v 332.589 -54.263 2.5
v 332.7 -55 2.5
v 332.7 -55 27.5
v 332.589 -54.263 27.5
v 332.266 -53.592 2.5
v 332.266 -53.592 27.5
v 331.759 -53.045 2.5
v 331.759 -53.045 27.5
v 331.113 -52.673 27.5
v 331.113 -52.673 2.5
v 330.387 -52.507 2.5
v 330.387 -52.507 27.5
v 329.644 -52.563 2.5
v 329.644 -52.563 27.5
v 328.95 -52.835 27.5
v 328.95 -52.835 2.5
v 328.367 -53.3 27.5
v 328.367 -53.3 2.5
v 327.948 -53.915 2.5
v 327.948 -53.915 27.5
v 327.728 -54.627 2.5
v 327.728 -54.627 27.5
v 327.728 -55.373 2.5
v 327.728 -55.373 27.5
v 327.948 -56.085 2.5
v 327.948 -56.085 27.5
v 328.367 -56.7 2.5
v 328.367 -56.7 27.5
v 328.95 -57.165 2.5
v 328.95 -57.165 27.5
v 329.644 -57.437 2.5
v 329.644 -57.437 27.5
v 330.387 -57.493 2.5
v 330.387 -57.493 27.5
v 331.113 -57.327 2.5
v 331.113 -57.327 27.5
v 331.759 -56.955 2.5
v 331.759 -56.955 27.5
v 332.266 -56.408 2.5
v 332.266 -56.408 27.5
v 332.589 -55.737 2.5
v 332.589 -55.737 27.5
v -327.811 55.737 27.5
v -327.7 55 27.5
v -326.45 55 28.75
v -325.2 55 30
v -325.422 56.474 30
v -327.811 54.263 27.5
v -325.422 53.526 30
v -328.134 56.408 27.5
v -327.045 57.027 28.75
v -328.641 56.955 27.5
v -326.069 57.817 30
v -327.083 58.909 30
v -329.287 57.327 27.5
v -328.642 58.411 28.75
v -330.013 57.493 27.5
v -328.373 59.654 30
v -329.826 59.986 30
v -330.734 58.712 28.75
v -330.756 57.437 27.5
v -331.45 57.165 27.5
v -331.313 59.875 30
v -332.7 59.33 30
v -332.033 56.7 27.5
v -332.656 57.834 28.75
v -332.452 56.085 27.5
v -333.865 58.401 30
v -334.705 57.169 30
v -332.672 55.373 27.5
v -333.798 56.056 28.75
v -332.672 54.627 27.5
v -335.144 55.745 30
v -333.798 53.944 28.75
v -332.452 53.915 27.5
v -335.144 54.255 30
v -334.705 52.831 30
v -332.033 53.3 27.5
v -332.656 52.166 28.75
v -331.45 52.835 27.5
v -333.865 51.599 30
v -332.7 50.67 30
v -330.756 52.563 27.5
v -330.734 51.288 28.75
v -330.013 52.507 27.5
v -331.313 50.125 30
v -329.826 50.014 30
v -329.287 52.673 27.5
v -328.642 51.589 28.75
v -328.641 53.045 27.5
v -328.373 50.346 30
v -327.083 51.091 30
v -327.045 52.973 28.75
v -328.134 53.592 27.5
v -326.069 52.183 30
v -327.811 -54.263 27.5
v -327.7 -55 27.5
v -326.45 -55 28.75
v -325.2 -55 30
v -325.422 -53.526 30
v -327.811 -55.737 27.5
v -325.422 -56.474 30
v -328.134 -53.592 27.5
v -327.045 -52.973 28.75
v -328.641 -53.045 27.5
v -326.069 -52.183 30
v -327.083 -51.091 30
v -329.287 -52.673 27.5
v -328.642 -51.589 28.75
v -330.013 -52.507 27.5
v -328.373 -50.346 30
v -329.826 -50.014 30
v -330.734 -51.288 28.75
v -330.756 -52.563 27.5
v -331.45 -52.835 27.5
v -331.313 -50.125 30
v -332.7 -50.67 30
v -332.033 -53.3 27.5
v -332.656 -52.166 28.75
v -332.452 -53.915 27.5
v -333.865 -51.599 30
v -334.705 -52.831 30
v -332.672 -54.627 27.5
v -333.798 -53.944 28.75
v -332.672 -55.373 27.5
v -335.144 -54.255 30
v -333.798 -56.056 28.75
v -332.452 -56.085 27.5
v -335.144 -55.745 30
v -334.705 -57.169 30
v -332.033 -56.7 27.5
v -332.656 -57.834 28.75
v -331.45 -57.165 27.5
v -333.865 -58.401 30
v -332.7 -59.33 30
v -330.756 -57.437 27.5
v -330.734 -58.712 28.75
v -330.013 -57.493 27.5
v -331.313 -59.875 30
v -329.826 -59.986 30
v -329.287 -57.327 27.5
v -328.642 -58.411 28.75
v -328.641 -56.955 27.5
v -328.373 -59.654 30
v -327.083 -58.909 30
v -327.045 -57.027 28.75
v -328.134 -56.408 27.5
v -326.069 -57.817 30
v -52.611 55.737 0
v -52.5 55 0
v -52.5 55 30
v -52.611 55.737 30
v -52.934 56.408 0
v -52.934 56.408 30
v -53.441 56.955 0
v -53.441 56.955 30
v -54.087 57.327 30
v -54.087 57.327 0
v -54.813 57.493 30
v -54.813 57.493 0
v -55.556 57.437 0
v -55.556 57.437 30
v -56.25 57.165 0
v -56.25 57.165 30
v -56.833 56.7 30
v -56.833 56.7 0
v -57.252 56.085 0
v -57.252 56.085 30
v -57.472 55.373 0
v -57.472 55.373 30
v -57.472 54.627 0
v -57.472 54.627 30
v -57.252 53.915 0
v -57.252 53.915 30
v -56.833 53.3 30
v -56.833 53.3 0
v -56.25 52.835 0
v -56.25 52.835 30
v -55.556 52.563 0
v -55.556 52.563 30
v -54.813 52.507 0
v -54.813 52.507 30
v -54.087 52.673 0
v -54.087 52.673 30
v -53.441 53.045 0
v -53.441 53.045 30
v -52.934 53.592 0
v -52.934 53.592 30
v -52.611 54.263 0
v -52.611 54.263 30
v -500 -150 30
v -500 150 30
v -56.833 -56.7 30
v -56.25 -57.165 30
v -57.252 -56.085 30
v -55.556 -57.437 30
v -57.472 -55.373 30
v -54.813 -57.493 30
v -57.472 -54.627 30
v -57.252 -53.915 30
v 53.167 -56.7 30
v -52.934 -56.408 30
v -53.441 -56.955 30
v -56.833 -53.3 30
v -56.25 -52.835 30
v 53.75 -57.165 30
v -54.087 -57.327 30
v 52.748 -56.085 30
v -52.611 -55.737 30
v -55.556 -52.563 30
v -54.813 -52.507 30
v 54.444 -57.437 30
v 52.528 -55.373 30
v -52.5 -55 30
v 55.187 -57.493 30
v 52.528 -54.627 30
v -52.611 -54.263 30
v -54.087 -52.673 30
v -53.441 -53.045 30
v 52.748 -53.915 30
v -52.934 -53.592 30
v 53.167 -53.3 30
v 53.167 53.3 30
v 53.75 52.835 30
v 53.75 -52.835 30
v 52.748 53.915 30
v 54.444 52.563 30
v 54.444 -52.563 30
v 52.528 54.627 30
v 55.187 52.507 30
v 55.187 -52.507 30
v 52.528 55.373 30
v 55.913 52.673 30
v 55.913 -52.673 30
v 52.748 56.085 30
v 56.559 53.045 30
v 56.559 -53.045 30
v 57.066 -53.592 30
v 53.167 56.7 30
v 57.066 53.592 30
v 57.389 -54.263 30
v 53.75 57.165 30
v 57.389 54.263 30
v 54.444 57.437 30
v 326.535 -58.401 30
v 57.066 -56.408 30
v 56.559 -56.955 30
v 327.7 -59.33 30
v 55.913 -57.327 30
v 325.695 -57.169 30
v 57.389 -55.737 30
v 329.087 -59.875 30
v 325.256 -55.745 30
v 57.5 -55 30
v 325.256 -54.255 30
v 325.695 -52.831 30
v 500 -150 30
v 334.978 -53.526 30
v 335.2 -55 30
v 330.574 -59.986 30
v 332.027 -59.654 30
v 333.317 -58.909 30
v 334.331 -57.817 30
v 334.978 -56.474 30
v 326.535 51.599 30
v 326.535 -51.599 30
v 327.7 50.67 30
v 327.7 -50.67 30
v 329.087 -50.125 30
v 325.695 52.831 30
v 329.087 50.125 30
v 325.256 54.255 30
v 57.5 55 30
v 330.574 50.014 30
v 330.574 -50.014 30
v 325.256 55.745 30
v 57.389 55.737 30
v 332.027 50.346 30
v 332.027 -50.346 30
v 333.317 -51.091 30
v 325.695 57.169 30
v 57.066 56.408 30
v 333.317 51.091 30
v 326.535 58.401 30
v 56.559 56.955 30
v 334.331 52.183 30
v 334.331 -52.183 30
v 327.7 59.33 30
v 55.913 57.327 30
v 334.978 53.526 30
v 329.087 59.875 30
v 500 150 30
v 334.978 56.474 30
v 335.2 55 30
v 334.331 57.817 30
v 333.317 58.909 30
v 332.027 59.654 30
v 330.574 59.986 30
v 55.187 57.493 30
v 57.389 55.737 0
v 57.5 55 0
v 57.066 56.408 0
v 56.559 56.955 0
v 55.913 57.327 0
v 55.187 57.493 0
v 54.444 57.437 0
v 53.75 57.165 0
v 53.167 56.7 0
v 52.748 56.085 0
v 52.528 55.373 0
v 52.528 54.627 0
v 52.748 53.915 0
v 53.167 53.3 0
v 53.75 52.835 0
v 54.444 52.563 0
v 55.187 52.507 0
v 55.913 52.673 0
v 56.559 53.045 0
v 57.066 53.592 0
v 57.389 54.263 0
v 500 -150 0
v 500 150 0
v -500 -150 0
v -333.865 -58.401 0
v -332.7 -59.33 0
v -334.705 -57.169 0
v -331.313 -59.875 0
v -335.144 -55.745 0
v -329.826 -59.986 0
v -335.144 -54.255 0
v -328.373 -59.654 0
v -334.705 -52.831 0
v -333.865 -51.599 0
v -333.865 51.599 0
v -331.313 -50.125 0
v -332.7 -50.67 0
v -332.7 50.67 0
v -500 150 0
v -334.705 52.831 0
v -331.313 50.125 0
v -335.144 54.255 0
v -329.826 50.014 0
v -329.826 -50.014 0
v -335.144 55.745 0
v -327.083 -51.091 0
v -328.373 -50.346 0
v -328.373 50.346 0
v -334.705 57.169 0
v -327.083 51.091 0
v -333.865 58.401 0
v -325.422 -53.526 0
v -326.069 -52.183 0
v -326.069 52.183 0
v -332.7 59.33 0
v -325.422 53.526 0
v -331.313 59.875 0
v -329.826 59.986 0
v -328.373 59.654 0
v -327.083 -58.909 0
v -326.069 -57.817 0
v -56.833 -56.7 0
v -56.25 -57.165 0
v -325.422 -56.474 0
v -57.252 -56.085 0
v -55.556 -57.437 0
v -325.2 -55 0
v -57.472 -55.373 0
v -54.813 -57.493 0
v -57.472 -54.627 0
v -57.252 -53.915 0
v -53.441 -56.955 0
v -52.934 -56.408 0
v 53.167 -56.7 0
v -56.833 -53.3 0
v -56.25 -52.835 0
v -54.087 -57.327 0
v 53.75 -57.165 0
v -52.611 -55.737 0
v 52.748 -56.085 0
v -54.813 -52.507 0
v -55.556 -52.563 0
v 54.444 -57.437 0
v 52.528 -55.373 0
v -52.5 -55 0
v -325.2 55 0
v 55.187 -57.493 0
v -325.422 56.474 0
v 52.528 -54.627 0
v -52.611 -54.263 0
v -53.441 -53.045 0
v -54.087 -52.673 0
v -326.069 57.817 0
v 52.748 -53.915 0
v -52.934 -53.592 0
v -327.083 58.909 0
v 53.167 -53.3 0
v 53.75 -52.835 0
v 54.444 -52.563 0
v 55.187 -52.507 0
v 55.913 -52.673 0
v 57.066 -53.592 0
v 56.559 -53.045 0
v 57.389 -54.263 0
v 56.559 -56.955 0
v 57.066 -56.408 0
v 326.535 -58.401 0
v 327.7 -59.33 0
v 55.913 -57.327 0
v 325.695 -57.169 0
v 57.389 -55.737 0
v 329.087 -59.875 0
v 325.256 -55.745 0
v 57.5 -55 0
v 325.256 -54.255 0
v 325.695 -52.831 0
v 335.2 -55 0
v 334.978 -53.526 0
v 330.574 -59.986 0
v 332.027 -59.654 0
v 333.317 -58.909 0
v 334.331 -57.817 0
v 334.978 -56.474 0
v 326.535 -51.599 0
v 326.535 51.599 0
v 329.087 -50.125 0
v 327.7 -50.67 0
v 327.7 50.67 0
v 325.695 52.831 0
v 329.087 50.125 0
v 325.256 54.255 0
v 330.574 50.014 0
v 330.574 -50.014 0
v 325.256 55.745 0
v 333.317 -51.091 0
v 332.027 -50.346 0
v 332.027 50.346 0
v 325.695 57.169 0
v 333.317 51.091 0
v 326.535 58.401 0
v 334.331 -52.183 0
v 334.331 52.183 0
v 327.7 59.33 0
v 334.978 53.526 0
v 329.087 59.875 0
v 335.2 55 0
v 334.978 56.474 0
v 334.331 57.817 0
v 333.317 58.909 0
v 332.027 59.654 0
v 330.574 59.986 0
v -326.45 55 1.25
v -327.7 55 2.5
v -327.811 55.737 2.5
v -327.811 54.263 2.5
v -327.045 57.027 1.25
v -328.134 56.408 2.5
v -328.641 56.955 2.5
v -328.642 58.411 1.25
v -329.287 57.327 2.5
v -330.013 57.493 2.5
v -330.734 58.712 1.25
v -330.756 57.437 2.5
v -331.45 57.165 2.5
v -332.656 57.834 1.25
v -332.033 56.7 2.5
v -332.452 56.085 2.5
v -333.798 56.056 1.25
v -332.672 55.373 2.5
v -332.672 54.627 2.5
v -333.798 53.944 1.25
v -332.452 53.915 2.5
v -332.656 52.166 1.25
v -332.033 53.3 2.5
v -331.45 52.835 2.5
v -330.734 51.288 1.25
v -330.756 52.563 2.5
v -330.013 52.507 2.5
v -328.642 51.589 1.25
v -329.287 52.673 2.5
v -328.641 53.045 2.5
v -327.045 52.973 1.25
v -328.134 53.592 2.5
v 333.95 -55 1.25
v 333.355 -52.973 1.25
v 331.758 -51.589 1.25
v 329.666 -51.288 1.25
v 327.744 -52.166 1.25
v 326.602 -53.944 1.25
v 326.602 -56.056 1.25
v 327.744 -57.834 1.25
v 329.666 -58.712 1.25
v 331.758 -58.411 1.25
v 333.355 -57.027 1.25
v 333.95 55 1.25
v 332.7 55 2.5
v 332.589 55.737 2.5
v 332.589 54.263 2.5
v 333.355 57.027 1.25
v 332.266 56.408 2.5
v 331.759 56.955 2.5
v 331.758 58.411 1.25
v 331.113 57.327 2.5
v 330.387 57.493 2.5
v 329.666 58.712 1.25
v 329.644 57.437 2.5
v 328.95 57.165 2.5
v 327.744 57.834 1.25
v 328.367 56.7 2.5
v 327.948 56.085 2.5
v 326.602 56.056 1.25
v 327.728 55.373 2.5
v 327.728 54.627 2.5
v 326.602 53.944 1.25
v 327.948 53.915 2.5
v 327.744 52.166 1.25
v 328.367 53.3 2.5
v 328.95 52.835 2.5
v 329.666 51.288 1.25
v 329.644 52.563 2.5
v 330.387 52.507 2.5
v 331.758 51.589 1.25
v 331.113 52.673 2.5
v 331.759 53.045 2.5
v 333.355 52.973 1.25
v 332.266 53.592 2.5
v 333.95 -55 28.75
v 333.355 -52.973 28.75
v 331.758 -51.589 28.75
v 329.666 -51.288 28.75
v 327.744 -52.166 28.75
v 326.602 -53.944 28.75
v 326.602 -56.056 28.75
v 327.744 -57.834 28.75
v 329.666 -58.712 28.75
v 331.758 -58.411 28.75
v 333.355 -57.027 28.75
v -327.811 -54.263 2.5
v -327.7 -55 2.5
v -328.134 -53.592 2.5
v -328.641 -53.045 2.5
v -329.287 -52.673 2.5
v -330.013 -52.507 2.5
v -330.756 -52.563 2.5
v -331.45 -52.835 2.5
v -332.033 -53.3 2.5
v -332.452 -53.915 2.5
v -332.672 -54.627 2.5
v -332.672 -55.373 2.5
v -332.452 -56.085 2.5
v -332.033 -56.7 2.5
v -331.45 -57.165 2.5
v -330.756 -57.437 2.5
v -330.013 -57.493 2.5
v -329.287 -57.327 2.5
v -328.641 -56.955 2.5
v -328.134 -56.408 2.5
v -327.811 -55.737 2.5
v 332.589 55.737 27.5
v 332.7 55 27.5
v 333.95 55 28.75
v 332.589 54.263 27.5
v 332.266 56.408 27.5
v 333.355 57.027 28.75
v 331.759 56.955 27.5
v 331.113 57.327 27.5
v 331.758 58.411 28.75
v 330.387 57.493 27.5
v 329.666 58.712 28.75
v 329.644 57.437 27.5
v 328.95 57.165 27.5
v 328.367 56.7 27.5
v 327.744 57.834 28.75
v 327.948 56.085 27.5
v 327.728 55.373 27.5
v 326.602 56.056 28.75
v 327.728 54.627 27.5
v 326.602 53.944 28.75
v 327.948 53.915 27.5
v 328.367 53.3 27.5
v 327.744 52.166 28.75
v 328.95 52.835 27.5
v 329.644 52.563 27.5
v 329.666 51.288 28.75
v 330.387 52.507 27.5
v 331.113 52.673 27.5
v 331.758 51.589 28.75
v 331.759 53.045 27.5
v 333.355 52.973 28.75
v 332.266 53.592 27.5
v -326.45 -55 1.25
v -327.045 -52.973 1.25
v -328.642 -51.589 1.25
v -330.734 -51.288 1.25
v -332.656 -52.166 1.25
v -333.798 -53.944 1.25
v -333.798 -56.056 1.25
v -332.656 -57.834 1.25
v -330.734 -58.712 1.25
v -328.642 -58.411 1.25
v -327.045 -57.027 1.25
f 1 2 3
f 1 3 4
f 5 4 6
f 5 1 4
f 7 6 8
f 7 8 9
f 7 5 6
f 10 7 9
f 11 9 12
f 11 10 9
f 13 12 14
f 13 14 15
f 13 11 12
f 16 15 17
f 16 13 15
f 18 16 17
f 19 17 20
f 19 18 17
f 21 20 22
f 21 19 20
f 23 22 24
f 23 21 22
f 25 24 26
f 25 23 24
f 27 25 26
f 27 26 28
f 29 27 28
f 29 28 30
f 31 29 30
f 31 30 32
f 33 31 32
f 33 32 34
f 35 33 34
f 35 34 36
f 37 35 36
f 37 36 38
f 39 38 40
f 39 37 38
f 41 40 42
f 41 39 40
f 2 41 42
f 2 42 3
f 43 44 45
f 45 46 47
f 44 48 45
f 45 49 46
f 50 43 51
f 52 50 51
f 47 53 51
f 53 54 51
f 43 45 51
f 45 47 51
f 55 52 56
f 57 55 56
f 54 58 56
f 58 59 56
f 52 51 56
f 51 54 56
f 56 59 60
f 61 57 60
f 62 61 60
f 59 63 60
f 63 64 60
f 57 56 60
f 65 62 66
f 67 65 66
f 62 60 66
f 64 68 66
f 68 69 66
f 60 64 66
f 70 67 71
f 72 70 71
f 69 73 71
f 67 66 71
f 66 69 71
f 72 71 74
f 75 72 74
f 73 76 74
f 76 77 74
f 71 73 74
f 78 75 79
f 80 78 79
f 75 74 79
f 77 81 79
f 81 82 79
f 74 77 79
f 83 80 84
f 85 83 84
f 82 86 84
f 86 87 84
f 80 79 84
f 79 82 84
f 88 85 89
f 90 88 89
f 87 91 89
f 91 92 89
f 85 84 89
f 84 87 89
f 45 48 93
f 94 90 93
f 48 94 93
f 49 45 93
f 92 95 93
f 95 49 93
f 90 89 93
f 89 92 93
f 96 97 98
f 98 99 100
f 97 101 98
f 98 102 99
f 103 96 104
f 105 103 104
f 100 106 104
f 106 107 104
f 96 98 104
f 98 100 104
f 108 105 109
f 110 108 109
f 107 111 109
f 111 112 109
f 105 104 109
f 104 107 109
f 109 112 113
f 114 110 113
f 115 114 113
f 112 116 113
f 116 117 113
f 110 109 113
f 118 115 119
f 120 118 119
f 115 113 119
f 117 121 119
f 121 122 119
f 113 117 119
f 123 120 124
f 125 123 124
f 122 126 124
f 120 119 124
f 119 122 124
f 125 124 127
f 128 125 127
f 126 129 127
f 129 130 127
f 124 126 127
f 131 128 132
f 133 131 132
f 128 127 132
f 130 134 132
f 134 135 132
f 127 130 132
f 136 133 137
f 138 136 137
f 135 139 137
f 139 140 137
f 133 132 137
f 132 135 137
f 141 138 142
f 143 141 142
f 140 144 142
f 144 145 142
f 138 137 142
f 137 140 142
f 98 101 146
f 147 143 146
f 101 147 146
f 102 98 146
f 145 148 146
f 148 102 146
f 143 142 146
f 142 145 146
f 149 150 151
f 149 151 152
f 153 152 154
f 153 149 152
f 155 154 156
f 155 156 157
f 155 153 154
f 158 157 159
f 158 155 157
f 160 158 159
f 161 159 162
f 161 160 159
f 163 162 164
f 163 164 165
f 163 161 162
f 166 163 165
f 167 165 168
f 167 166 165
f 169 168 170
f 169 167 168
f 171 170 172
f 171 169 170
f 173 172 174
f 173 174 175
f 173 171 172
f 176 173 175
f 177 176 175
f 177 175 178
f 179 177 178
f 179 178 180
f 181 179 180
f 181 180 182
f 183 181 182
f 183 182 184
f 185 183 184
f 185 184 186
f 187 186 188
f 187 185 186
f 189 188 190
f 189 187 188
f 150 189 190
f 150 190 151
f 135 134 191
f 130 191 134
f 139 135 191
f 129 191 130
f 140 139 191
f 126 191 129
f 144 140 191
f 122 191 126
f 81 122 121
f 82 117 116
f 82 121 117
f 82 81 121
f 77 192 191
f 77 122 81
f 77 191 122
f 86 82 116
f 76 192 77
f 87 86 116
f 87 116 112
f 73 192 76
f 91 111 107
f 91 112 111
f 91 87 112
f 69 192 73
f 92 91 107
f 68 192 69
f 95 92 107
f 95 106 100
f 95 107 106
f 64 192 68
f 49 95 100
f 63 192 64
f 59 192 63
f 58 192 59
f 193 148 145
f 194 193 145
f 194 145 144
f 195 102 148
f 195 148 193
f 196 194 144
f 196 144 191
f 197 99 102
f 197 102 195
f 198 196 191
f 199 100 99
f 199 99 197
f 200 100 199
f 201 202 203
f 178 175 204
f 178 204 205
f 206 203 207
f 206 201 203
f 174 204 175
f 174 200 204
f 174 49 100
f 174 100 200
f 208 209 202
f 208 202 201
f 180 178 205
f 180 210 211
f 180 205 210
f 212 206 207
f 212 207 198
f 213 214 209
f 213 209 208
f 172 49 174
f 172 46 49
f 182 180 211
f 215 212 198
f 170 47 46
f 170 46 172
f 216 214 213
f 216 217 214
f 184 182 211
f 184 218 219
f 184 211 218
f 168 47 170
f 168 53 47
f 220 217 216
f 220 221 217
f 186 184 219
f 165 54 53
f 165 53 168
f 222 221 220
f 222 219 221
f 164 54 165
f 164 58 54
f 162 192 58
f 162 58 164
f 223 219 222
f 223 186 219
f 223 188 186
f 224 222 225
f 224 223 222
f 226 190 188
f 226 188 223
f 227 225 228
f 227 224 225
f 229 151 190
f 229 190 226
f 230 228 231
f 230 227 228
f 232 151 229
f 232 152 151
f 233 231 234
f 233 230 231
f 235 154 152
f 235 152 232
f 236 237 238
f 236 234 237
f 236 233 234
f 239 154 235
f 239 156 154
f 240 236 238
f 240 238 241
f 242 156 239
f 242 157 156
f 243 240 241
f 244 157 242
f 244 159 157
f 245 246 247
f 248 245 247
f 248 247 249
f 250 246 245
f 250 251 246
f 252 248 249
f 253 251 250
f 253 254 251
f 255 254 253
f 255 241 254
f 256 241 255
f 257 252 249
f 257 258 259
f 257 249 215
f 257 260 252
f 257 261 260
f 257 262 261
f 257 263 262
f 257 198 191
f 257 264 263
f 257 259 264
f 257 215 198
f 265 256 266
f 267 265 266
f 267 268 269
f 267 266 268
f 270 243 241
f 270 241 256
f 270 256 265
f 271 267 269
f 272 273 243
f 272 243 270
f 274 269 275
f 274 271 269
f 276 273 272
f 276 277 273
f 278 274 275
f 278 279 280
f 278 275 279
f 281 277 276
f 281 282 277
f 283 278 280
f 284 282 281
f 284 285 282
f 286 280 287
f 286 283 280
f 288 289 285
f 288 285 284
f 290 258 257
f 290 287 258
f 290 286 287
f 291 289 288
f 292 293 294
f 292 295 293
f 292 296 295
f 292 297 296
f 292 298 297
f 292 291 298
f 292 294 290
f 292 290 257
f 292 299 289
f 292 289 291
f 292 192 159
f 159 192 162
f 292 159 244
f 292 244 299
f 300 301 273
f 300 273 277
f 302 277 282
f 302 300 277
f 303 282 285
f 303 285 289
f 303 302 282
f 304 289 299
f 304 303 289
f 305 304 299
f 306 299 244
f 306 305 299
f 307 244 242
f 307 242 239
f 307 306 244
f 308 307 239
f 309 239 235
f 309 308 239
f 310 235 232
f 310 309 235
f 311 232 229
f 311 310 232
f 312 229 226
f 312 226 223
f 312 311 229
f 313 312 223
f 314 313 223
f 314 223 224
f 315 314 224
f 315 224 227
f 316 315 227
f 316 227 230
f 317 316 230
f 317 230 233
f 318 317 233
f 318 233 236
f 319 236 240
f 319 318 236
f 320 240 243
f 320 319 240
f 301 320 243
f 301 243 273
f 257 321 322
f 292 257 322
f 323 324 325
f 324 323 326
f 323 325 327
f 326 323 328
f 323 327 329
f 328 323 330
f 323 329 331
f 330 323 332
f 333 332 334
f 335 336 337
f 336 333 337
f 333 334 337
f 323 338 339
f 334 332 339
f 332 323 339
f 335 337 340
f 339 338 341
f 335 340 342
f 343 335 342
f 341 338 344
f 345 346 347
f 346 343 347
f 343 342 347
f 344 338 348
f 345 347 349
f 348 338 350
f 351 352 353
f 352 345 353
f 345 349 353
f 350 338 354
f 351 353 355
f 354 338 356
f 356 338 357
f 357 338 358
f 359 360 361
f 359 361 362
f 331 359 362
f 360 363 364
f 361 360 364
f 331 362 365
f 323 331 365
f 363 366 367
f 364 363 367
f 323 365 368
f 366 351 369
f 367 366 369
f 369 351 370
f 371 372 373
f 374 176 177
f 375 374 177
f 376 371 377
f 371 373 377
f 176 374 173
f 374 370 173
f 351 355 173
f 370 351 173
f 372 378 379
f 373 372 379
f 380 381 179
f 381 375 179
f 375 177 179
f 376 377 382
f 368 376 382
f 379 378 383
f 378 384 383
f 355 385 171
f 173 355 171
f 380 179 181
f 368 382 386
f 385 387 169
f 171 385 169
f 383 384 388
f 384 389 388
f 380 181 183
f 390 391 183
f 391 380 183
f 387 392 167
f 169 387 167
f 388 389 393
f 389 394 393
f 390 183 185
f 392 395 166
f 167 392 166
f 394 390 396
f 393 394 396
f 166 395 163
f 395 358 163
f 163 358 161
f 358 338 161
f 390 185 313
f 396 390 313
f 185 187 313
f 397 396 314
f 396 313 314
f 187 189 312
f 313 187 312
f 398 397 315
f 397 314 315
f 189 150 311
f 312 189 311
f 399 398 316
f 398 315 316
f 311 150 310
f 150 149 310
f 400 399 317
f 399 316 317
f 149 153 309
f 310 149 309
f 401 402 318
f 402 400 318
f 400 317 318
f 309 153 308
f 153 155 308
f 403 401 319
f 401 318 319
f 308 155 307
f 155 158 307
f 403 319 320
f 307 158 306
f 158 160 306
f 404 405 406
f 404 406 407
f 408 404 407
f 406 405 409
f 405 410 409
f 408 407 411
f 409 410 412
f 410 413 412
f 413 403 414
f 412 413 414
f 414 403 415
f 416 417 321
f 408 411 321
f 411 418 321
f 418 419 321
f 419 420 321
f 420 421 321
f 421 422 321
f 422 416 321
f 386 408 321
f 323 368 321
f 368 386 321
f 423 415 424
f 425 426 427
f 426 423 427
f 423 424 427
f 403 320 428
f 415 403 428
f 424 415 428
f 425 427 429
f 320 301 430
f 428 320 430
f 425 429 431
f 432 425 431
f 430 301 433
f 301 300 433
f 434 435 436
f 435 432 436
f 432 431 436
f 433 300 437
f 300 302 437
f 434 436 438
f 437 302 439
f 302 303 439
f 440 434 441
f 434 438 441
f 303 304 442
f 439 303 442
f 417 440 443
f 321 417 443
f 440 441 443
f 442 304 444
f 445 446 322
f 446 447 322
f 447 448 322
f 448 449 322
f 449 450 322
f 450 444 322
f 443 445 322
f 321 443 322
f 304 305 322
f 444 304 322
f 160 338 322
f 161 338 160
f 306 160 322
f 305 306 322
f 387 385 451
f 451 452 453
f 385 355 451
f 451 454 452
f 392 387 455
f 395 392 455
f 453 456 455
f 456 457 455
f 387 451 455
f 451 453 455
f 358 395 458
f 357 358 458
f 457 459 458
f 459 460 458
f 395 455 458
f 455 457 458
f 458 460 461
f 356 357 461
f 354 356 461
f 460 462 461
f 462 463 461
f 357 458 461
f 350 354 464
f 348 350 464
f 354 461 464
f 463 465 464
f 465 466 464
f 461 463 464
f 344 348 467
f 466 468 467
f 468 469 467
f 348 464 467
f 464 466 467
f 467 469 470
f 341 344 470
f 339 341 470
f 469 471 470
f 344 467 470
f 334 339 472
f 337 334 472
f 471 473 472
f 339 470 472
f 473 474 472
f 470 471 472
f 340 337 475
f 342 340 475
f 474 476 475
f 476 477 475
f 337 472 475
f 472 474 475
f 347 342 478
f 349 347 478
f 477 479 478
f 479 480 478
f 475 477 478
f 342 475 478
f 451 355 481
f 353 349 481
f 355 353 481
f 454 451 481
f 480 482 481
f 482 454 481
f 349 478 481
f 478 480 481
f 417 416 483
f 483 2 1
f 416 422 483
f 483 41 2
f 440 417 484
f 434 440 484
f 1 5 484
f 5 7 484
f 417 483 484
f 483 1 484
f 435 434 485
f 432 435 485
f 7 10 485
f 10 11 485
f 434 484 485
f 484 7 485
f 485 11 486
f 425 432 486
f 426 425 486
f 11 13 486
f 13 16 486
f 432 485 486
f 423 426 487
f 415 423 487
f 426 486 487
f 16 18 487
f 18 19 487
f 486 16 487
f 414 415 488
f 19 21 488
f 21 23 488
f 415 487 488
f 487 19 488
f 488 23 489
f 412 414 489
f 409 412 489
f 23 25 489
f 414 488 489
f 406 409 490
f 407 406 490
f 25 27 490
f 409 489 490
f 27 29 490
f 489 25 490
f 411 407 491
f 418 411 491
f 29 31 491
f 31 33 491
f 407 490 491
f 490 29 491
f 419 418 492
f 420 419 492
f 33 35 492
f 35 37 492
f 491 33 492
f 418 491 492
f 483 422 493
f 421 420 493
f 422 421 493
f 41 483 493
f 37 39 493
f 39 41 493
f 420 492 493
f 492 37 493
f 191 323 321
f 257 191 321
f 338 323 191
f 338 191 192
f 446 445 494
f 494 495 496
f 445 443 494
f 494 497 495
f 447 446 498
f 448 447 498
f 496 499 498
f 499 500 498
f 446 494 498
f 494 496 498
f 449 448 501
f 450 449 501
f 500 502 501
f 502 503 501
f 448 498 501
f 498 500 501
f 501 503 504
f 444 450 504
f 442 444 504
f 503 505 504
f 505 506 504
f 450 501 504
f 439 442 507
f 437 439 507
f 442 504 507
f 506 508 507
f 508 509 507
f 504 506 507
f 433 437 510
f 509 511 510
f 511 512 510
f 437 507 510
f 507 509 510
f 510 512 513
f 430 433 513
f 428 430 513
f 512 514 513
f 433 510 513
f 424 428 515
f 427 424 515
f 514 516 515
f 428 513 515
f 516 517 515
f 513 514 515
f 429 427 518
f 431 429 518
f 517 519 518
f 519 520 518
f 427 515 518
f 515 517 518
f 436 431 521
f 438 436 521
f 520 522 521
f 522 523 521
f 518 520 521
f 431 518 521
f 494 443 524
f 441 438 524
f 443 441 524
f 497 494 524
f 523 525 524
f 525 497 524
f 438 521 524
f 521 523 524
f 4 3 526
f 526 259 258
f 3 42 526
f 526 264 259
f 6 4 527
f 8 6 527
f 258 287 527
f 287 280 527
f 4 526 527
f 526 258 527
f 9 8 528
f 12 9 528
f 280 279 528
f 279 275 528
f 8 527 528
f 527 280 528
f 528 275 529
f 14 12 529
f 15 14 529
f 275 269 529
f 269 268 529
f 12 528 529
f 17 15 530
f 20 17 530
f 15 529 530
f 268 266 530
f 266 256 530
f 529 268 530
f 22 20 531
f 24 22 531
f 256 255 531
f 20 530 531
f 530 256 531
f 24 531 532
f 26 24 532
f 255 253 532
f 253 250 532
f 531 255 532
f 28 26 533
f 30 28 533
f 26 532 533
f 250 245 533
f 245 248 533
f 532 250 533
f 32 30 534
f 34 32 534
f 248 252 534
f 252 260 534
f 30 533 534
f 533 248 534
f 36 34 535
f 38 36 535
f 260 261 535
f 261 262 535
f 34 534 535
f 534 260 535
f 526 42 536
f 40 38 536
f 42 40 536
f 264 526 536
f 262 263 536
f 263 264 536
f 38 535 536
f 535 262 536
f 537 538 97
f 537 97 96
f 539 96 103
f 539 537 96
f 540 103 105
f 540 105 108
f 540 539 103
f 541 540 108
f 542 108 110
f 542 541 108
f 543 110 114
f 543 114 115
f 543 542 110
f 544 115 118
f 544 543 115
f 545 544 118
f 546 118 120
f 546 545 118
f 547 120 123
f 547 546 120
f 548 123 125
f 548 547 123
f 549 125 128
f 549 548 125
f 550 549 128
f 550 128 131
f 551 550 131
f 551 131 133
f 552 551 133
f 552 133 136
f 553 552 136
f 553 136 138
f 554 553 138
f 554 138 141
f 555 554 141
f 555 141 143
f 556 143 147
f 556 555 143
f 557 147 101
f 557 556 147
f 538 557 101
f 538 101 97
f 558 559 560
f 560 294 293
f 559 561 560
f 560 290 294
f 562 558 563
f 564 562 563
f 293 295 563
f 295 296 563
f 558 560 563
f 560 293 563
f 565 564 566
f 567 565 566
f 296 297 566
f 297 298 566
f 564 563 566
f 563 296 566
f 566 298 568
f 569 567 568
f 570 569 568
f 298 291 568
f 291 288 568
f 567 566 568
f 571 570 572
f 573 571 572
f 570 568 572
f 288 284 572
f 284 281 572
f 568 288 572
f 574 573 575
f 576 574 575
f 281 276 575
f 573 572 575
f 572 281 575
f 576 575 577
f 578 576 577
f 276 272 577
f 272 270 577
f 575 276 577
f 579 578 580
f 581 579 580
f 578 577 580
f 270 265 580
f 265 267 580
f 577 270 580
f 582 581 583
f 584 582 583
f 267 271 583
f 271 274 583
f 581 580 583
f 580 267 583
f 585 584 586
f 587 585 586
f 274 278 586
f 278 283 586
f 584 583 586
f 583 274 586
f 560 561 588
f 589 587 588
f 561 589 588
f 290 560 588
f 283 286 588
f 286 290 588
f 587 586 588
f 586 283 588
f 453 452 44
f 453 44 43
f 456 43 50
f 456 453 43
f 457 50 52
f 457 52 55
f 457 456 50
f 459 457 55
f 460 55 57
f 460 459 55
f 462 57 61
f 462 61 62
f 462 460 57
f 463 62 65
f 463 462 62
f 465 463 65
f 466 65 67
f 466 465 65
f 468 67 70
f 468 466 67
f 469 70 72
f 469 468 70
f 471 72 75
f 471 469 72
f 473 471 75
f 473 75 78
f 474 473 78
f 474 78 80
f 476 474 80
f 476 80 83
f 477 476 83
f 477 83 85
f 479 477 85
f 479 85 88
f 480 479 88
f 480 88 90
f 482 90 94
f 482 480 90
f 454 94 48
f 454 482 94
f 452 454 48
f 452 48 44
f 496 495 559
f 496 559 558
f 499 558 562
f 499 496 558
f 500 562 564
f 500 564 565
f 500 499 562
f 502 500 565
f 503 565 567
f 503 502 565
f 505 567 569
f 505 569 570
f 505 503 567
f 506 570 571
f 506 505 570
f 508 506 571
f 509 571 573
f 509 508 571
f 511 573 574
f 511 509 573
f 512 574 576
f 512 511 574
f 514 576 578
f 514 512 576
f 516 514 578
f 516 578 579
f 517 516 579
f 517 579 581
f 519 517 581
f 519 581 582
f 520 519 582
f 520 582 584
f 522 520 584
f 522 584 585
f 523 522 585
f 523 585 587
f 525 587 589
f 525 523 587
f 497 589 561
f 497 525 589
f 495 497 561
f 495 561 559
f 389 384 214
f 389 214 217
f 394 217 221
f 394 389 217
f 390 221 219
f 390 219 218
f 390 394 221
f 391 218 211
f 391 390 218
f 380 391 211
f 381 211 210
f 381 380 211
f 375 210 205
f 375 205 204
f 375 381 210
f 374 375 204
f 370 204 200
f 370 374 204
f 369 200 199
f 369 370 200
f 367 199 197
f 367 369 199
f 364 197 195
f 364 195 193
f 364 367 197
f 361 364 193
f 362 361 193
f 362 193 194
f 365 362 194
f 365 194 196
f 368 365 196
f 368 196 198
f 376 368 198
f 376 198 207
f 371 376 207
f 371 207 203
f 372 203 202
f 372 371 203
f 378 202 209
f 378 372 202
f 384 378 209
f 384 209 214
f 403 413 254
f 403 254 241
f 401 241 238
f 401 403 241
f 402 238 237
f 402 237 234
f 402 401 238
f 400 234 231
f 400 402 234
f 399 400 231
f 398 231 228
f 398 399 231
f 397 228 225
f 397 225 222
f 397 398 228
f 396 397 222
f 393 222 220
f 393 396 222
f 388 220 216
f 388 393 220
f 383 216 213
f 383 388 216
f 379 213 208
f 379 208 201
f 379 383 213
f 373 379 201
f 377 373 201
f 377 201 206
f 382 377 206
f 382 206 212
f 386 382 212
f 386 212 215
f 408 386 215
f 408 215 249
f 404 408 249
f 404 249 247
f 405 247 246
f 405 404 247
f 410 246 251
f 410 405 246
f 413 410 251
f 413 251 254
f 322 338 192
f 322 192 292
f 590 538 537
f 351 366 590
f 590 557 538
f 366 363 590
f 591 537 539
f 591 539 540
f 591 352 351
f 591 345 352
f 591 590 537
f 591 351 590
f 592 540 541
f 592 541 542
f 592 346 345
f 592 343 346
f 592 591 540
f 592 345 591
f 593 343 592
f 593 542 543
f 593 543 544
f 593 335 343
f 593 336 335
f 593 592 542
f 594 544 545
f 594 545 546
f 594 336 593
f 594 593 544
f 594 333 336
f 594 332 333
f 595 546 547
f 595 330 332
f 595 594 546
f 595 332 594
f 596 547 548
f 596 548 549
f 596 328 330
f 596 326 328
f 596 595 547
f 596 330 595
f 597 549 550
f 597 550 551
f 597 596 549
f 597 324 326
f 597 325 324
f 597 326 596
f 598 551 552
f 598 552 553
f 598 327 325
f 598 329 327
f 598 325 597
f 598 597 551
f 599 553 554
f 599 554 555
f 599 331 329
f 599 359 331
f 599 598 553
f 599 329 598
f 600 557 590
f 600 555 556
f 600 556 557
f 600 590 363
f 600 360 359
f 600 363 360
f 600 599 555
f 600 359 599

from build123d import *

# Parameters (mm, degrees)
F0_W     = 1000
F0_H     = 300
F0_R     = 2.5
F1_DEPTH = 30
F2_SIZE  = 2.5
F3_SIZE  = 2.5


with BuildPart() as f1:
    # F0 (on Top) → F1 (new body)
    with BuildSketch(Plane.XY):
        Rectangle(F0_W, F0_H)
        with Locations((-330.2, -55)):
            Circle(F0_R, mode=Mode.SUBTRACT)
        with Locations((-55, -55)):
            Circle(F0_R, mode=Mode.SUBTRACT)
        with Locations((55, -55)):
            Circle(F0_R, mode=Mode.SUBTRACT)
        with Locations((330.2, -55)):
            Circle(F0_R, mode=Mode.SUBTRACT)
        with Locations((-330.2, 55)):
            Circle(F0_R, mode=Mode.SUBTRACT)
        with Locations((-55, 55)):
            Circle(F0_R, mode=Mode.SUBTRACT)
        with Locations((55, 55)):
            Circle(F0_R, mode=Mode.SUBTRACT)
        with Locations((330.2, 55)):
            Circle(F0_R, mode=Mode.SUBTRACT)
    extrude(amount=F1_DEPTH)

    # F2
    f2_edges = [f1.edges().sort_by_distance(p)[0] for p in [
        (-332.7, 55, 30),
        (-332.7, -55, 30),
        (327.7, 55, 30),
        (327.7, -55, 30),
    ]]
    chamfer(f2_edges, length=F2_SIZE)

    # F3
    f3_edges = [f1.edges().sort_by_distance(p)[0] for p in [
        (-332.7, -55, 0),
        (-332.7, 55, 0),
        (327.7, -55, 0),
        (327.7, 55, 0),
    ]]
    chamfer(f3_edges, length=F3_SIZE)


solid = f1.part
